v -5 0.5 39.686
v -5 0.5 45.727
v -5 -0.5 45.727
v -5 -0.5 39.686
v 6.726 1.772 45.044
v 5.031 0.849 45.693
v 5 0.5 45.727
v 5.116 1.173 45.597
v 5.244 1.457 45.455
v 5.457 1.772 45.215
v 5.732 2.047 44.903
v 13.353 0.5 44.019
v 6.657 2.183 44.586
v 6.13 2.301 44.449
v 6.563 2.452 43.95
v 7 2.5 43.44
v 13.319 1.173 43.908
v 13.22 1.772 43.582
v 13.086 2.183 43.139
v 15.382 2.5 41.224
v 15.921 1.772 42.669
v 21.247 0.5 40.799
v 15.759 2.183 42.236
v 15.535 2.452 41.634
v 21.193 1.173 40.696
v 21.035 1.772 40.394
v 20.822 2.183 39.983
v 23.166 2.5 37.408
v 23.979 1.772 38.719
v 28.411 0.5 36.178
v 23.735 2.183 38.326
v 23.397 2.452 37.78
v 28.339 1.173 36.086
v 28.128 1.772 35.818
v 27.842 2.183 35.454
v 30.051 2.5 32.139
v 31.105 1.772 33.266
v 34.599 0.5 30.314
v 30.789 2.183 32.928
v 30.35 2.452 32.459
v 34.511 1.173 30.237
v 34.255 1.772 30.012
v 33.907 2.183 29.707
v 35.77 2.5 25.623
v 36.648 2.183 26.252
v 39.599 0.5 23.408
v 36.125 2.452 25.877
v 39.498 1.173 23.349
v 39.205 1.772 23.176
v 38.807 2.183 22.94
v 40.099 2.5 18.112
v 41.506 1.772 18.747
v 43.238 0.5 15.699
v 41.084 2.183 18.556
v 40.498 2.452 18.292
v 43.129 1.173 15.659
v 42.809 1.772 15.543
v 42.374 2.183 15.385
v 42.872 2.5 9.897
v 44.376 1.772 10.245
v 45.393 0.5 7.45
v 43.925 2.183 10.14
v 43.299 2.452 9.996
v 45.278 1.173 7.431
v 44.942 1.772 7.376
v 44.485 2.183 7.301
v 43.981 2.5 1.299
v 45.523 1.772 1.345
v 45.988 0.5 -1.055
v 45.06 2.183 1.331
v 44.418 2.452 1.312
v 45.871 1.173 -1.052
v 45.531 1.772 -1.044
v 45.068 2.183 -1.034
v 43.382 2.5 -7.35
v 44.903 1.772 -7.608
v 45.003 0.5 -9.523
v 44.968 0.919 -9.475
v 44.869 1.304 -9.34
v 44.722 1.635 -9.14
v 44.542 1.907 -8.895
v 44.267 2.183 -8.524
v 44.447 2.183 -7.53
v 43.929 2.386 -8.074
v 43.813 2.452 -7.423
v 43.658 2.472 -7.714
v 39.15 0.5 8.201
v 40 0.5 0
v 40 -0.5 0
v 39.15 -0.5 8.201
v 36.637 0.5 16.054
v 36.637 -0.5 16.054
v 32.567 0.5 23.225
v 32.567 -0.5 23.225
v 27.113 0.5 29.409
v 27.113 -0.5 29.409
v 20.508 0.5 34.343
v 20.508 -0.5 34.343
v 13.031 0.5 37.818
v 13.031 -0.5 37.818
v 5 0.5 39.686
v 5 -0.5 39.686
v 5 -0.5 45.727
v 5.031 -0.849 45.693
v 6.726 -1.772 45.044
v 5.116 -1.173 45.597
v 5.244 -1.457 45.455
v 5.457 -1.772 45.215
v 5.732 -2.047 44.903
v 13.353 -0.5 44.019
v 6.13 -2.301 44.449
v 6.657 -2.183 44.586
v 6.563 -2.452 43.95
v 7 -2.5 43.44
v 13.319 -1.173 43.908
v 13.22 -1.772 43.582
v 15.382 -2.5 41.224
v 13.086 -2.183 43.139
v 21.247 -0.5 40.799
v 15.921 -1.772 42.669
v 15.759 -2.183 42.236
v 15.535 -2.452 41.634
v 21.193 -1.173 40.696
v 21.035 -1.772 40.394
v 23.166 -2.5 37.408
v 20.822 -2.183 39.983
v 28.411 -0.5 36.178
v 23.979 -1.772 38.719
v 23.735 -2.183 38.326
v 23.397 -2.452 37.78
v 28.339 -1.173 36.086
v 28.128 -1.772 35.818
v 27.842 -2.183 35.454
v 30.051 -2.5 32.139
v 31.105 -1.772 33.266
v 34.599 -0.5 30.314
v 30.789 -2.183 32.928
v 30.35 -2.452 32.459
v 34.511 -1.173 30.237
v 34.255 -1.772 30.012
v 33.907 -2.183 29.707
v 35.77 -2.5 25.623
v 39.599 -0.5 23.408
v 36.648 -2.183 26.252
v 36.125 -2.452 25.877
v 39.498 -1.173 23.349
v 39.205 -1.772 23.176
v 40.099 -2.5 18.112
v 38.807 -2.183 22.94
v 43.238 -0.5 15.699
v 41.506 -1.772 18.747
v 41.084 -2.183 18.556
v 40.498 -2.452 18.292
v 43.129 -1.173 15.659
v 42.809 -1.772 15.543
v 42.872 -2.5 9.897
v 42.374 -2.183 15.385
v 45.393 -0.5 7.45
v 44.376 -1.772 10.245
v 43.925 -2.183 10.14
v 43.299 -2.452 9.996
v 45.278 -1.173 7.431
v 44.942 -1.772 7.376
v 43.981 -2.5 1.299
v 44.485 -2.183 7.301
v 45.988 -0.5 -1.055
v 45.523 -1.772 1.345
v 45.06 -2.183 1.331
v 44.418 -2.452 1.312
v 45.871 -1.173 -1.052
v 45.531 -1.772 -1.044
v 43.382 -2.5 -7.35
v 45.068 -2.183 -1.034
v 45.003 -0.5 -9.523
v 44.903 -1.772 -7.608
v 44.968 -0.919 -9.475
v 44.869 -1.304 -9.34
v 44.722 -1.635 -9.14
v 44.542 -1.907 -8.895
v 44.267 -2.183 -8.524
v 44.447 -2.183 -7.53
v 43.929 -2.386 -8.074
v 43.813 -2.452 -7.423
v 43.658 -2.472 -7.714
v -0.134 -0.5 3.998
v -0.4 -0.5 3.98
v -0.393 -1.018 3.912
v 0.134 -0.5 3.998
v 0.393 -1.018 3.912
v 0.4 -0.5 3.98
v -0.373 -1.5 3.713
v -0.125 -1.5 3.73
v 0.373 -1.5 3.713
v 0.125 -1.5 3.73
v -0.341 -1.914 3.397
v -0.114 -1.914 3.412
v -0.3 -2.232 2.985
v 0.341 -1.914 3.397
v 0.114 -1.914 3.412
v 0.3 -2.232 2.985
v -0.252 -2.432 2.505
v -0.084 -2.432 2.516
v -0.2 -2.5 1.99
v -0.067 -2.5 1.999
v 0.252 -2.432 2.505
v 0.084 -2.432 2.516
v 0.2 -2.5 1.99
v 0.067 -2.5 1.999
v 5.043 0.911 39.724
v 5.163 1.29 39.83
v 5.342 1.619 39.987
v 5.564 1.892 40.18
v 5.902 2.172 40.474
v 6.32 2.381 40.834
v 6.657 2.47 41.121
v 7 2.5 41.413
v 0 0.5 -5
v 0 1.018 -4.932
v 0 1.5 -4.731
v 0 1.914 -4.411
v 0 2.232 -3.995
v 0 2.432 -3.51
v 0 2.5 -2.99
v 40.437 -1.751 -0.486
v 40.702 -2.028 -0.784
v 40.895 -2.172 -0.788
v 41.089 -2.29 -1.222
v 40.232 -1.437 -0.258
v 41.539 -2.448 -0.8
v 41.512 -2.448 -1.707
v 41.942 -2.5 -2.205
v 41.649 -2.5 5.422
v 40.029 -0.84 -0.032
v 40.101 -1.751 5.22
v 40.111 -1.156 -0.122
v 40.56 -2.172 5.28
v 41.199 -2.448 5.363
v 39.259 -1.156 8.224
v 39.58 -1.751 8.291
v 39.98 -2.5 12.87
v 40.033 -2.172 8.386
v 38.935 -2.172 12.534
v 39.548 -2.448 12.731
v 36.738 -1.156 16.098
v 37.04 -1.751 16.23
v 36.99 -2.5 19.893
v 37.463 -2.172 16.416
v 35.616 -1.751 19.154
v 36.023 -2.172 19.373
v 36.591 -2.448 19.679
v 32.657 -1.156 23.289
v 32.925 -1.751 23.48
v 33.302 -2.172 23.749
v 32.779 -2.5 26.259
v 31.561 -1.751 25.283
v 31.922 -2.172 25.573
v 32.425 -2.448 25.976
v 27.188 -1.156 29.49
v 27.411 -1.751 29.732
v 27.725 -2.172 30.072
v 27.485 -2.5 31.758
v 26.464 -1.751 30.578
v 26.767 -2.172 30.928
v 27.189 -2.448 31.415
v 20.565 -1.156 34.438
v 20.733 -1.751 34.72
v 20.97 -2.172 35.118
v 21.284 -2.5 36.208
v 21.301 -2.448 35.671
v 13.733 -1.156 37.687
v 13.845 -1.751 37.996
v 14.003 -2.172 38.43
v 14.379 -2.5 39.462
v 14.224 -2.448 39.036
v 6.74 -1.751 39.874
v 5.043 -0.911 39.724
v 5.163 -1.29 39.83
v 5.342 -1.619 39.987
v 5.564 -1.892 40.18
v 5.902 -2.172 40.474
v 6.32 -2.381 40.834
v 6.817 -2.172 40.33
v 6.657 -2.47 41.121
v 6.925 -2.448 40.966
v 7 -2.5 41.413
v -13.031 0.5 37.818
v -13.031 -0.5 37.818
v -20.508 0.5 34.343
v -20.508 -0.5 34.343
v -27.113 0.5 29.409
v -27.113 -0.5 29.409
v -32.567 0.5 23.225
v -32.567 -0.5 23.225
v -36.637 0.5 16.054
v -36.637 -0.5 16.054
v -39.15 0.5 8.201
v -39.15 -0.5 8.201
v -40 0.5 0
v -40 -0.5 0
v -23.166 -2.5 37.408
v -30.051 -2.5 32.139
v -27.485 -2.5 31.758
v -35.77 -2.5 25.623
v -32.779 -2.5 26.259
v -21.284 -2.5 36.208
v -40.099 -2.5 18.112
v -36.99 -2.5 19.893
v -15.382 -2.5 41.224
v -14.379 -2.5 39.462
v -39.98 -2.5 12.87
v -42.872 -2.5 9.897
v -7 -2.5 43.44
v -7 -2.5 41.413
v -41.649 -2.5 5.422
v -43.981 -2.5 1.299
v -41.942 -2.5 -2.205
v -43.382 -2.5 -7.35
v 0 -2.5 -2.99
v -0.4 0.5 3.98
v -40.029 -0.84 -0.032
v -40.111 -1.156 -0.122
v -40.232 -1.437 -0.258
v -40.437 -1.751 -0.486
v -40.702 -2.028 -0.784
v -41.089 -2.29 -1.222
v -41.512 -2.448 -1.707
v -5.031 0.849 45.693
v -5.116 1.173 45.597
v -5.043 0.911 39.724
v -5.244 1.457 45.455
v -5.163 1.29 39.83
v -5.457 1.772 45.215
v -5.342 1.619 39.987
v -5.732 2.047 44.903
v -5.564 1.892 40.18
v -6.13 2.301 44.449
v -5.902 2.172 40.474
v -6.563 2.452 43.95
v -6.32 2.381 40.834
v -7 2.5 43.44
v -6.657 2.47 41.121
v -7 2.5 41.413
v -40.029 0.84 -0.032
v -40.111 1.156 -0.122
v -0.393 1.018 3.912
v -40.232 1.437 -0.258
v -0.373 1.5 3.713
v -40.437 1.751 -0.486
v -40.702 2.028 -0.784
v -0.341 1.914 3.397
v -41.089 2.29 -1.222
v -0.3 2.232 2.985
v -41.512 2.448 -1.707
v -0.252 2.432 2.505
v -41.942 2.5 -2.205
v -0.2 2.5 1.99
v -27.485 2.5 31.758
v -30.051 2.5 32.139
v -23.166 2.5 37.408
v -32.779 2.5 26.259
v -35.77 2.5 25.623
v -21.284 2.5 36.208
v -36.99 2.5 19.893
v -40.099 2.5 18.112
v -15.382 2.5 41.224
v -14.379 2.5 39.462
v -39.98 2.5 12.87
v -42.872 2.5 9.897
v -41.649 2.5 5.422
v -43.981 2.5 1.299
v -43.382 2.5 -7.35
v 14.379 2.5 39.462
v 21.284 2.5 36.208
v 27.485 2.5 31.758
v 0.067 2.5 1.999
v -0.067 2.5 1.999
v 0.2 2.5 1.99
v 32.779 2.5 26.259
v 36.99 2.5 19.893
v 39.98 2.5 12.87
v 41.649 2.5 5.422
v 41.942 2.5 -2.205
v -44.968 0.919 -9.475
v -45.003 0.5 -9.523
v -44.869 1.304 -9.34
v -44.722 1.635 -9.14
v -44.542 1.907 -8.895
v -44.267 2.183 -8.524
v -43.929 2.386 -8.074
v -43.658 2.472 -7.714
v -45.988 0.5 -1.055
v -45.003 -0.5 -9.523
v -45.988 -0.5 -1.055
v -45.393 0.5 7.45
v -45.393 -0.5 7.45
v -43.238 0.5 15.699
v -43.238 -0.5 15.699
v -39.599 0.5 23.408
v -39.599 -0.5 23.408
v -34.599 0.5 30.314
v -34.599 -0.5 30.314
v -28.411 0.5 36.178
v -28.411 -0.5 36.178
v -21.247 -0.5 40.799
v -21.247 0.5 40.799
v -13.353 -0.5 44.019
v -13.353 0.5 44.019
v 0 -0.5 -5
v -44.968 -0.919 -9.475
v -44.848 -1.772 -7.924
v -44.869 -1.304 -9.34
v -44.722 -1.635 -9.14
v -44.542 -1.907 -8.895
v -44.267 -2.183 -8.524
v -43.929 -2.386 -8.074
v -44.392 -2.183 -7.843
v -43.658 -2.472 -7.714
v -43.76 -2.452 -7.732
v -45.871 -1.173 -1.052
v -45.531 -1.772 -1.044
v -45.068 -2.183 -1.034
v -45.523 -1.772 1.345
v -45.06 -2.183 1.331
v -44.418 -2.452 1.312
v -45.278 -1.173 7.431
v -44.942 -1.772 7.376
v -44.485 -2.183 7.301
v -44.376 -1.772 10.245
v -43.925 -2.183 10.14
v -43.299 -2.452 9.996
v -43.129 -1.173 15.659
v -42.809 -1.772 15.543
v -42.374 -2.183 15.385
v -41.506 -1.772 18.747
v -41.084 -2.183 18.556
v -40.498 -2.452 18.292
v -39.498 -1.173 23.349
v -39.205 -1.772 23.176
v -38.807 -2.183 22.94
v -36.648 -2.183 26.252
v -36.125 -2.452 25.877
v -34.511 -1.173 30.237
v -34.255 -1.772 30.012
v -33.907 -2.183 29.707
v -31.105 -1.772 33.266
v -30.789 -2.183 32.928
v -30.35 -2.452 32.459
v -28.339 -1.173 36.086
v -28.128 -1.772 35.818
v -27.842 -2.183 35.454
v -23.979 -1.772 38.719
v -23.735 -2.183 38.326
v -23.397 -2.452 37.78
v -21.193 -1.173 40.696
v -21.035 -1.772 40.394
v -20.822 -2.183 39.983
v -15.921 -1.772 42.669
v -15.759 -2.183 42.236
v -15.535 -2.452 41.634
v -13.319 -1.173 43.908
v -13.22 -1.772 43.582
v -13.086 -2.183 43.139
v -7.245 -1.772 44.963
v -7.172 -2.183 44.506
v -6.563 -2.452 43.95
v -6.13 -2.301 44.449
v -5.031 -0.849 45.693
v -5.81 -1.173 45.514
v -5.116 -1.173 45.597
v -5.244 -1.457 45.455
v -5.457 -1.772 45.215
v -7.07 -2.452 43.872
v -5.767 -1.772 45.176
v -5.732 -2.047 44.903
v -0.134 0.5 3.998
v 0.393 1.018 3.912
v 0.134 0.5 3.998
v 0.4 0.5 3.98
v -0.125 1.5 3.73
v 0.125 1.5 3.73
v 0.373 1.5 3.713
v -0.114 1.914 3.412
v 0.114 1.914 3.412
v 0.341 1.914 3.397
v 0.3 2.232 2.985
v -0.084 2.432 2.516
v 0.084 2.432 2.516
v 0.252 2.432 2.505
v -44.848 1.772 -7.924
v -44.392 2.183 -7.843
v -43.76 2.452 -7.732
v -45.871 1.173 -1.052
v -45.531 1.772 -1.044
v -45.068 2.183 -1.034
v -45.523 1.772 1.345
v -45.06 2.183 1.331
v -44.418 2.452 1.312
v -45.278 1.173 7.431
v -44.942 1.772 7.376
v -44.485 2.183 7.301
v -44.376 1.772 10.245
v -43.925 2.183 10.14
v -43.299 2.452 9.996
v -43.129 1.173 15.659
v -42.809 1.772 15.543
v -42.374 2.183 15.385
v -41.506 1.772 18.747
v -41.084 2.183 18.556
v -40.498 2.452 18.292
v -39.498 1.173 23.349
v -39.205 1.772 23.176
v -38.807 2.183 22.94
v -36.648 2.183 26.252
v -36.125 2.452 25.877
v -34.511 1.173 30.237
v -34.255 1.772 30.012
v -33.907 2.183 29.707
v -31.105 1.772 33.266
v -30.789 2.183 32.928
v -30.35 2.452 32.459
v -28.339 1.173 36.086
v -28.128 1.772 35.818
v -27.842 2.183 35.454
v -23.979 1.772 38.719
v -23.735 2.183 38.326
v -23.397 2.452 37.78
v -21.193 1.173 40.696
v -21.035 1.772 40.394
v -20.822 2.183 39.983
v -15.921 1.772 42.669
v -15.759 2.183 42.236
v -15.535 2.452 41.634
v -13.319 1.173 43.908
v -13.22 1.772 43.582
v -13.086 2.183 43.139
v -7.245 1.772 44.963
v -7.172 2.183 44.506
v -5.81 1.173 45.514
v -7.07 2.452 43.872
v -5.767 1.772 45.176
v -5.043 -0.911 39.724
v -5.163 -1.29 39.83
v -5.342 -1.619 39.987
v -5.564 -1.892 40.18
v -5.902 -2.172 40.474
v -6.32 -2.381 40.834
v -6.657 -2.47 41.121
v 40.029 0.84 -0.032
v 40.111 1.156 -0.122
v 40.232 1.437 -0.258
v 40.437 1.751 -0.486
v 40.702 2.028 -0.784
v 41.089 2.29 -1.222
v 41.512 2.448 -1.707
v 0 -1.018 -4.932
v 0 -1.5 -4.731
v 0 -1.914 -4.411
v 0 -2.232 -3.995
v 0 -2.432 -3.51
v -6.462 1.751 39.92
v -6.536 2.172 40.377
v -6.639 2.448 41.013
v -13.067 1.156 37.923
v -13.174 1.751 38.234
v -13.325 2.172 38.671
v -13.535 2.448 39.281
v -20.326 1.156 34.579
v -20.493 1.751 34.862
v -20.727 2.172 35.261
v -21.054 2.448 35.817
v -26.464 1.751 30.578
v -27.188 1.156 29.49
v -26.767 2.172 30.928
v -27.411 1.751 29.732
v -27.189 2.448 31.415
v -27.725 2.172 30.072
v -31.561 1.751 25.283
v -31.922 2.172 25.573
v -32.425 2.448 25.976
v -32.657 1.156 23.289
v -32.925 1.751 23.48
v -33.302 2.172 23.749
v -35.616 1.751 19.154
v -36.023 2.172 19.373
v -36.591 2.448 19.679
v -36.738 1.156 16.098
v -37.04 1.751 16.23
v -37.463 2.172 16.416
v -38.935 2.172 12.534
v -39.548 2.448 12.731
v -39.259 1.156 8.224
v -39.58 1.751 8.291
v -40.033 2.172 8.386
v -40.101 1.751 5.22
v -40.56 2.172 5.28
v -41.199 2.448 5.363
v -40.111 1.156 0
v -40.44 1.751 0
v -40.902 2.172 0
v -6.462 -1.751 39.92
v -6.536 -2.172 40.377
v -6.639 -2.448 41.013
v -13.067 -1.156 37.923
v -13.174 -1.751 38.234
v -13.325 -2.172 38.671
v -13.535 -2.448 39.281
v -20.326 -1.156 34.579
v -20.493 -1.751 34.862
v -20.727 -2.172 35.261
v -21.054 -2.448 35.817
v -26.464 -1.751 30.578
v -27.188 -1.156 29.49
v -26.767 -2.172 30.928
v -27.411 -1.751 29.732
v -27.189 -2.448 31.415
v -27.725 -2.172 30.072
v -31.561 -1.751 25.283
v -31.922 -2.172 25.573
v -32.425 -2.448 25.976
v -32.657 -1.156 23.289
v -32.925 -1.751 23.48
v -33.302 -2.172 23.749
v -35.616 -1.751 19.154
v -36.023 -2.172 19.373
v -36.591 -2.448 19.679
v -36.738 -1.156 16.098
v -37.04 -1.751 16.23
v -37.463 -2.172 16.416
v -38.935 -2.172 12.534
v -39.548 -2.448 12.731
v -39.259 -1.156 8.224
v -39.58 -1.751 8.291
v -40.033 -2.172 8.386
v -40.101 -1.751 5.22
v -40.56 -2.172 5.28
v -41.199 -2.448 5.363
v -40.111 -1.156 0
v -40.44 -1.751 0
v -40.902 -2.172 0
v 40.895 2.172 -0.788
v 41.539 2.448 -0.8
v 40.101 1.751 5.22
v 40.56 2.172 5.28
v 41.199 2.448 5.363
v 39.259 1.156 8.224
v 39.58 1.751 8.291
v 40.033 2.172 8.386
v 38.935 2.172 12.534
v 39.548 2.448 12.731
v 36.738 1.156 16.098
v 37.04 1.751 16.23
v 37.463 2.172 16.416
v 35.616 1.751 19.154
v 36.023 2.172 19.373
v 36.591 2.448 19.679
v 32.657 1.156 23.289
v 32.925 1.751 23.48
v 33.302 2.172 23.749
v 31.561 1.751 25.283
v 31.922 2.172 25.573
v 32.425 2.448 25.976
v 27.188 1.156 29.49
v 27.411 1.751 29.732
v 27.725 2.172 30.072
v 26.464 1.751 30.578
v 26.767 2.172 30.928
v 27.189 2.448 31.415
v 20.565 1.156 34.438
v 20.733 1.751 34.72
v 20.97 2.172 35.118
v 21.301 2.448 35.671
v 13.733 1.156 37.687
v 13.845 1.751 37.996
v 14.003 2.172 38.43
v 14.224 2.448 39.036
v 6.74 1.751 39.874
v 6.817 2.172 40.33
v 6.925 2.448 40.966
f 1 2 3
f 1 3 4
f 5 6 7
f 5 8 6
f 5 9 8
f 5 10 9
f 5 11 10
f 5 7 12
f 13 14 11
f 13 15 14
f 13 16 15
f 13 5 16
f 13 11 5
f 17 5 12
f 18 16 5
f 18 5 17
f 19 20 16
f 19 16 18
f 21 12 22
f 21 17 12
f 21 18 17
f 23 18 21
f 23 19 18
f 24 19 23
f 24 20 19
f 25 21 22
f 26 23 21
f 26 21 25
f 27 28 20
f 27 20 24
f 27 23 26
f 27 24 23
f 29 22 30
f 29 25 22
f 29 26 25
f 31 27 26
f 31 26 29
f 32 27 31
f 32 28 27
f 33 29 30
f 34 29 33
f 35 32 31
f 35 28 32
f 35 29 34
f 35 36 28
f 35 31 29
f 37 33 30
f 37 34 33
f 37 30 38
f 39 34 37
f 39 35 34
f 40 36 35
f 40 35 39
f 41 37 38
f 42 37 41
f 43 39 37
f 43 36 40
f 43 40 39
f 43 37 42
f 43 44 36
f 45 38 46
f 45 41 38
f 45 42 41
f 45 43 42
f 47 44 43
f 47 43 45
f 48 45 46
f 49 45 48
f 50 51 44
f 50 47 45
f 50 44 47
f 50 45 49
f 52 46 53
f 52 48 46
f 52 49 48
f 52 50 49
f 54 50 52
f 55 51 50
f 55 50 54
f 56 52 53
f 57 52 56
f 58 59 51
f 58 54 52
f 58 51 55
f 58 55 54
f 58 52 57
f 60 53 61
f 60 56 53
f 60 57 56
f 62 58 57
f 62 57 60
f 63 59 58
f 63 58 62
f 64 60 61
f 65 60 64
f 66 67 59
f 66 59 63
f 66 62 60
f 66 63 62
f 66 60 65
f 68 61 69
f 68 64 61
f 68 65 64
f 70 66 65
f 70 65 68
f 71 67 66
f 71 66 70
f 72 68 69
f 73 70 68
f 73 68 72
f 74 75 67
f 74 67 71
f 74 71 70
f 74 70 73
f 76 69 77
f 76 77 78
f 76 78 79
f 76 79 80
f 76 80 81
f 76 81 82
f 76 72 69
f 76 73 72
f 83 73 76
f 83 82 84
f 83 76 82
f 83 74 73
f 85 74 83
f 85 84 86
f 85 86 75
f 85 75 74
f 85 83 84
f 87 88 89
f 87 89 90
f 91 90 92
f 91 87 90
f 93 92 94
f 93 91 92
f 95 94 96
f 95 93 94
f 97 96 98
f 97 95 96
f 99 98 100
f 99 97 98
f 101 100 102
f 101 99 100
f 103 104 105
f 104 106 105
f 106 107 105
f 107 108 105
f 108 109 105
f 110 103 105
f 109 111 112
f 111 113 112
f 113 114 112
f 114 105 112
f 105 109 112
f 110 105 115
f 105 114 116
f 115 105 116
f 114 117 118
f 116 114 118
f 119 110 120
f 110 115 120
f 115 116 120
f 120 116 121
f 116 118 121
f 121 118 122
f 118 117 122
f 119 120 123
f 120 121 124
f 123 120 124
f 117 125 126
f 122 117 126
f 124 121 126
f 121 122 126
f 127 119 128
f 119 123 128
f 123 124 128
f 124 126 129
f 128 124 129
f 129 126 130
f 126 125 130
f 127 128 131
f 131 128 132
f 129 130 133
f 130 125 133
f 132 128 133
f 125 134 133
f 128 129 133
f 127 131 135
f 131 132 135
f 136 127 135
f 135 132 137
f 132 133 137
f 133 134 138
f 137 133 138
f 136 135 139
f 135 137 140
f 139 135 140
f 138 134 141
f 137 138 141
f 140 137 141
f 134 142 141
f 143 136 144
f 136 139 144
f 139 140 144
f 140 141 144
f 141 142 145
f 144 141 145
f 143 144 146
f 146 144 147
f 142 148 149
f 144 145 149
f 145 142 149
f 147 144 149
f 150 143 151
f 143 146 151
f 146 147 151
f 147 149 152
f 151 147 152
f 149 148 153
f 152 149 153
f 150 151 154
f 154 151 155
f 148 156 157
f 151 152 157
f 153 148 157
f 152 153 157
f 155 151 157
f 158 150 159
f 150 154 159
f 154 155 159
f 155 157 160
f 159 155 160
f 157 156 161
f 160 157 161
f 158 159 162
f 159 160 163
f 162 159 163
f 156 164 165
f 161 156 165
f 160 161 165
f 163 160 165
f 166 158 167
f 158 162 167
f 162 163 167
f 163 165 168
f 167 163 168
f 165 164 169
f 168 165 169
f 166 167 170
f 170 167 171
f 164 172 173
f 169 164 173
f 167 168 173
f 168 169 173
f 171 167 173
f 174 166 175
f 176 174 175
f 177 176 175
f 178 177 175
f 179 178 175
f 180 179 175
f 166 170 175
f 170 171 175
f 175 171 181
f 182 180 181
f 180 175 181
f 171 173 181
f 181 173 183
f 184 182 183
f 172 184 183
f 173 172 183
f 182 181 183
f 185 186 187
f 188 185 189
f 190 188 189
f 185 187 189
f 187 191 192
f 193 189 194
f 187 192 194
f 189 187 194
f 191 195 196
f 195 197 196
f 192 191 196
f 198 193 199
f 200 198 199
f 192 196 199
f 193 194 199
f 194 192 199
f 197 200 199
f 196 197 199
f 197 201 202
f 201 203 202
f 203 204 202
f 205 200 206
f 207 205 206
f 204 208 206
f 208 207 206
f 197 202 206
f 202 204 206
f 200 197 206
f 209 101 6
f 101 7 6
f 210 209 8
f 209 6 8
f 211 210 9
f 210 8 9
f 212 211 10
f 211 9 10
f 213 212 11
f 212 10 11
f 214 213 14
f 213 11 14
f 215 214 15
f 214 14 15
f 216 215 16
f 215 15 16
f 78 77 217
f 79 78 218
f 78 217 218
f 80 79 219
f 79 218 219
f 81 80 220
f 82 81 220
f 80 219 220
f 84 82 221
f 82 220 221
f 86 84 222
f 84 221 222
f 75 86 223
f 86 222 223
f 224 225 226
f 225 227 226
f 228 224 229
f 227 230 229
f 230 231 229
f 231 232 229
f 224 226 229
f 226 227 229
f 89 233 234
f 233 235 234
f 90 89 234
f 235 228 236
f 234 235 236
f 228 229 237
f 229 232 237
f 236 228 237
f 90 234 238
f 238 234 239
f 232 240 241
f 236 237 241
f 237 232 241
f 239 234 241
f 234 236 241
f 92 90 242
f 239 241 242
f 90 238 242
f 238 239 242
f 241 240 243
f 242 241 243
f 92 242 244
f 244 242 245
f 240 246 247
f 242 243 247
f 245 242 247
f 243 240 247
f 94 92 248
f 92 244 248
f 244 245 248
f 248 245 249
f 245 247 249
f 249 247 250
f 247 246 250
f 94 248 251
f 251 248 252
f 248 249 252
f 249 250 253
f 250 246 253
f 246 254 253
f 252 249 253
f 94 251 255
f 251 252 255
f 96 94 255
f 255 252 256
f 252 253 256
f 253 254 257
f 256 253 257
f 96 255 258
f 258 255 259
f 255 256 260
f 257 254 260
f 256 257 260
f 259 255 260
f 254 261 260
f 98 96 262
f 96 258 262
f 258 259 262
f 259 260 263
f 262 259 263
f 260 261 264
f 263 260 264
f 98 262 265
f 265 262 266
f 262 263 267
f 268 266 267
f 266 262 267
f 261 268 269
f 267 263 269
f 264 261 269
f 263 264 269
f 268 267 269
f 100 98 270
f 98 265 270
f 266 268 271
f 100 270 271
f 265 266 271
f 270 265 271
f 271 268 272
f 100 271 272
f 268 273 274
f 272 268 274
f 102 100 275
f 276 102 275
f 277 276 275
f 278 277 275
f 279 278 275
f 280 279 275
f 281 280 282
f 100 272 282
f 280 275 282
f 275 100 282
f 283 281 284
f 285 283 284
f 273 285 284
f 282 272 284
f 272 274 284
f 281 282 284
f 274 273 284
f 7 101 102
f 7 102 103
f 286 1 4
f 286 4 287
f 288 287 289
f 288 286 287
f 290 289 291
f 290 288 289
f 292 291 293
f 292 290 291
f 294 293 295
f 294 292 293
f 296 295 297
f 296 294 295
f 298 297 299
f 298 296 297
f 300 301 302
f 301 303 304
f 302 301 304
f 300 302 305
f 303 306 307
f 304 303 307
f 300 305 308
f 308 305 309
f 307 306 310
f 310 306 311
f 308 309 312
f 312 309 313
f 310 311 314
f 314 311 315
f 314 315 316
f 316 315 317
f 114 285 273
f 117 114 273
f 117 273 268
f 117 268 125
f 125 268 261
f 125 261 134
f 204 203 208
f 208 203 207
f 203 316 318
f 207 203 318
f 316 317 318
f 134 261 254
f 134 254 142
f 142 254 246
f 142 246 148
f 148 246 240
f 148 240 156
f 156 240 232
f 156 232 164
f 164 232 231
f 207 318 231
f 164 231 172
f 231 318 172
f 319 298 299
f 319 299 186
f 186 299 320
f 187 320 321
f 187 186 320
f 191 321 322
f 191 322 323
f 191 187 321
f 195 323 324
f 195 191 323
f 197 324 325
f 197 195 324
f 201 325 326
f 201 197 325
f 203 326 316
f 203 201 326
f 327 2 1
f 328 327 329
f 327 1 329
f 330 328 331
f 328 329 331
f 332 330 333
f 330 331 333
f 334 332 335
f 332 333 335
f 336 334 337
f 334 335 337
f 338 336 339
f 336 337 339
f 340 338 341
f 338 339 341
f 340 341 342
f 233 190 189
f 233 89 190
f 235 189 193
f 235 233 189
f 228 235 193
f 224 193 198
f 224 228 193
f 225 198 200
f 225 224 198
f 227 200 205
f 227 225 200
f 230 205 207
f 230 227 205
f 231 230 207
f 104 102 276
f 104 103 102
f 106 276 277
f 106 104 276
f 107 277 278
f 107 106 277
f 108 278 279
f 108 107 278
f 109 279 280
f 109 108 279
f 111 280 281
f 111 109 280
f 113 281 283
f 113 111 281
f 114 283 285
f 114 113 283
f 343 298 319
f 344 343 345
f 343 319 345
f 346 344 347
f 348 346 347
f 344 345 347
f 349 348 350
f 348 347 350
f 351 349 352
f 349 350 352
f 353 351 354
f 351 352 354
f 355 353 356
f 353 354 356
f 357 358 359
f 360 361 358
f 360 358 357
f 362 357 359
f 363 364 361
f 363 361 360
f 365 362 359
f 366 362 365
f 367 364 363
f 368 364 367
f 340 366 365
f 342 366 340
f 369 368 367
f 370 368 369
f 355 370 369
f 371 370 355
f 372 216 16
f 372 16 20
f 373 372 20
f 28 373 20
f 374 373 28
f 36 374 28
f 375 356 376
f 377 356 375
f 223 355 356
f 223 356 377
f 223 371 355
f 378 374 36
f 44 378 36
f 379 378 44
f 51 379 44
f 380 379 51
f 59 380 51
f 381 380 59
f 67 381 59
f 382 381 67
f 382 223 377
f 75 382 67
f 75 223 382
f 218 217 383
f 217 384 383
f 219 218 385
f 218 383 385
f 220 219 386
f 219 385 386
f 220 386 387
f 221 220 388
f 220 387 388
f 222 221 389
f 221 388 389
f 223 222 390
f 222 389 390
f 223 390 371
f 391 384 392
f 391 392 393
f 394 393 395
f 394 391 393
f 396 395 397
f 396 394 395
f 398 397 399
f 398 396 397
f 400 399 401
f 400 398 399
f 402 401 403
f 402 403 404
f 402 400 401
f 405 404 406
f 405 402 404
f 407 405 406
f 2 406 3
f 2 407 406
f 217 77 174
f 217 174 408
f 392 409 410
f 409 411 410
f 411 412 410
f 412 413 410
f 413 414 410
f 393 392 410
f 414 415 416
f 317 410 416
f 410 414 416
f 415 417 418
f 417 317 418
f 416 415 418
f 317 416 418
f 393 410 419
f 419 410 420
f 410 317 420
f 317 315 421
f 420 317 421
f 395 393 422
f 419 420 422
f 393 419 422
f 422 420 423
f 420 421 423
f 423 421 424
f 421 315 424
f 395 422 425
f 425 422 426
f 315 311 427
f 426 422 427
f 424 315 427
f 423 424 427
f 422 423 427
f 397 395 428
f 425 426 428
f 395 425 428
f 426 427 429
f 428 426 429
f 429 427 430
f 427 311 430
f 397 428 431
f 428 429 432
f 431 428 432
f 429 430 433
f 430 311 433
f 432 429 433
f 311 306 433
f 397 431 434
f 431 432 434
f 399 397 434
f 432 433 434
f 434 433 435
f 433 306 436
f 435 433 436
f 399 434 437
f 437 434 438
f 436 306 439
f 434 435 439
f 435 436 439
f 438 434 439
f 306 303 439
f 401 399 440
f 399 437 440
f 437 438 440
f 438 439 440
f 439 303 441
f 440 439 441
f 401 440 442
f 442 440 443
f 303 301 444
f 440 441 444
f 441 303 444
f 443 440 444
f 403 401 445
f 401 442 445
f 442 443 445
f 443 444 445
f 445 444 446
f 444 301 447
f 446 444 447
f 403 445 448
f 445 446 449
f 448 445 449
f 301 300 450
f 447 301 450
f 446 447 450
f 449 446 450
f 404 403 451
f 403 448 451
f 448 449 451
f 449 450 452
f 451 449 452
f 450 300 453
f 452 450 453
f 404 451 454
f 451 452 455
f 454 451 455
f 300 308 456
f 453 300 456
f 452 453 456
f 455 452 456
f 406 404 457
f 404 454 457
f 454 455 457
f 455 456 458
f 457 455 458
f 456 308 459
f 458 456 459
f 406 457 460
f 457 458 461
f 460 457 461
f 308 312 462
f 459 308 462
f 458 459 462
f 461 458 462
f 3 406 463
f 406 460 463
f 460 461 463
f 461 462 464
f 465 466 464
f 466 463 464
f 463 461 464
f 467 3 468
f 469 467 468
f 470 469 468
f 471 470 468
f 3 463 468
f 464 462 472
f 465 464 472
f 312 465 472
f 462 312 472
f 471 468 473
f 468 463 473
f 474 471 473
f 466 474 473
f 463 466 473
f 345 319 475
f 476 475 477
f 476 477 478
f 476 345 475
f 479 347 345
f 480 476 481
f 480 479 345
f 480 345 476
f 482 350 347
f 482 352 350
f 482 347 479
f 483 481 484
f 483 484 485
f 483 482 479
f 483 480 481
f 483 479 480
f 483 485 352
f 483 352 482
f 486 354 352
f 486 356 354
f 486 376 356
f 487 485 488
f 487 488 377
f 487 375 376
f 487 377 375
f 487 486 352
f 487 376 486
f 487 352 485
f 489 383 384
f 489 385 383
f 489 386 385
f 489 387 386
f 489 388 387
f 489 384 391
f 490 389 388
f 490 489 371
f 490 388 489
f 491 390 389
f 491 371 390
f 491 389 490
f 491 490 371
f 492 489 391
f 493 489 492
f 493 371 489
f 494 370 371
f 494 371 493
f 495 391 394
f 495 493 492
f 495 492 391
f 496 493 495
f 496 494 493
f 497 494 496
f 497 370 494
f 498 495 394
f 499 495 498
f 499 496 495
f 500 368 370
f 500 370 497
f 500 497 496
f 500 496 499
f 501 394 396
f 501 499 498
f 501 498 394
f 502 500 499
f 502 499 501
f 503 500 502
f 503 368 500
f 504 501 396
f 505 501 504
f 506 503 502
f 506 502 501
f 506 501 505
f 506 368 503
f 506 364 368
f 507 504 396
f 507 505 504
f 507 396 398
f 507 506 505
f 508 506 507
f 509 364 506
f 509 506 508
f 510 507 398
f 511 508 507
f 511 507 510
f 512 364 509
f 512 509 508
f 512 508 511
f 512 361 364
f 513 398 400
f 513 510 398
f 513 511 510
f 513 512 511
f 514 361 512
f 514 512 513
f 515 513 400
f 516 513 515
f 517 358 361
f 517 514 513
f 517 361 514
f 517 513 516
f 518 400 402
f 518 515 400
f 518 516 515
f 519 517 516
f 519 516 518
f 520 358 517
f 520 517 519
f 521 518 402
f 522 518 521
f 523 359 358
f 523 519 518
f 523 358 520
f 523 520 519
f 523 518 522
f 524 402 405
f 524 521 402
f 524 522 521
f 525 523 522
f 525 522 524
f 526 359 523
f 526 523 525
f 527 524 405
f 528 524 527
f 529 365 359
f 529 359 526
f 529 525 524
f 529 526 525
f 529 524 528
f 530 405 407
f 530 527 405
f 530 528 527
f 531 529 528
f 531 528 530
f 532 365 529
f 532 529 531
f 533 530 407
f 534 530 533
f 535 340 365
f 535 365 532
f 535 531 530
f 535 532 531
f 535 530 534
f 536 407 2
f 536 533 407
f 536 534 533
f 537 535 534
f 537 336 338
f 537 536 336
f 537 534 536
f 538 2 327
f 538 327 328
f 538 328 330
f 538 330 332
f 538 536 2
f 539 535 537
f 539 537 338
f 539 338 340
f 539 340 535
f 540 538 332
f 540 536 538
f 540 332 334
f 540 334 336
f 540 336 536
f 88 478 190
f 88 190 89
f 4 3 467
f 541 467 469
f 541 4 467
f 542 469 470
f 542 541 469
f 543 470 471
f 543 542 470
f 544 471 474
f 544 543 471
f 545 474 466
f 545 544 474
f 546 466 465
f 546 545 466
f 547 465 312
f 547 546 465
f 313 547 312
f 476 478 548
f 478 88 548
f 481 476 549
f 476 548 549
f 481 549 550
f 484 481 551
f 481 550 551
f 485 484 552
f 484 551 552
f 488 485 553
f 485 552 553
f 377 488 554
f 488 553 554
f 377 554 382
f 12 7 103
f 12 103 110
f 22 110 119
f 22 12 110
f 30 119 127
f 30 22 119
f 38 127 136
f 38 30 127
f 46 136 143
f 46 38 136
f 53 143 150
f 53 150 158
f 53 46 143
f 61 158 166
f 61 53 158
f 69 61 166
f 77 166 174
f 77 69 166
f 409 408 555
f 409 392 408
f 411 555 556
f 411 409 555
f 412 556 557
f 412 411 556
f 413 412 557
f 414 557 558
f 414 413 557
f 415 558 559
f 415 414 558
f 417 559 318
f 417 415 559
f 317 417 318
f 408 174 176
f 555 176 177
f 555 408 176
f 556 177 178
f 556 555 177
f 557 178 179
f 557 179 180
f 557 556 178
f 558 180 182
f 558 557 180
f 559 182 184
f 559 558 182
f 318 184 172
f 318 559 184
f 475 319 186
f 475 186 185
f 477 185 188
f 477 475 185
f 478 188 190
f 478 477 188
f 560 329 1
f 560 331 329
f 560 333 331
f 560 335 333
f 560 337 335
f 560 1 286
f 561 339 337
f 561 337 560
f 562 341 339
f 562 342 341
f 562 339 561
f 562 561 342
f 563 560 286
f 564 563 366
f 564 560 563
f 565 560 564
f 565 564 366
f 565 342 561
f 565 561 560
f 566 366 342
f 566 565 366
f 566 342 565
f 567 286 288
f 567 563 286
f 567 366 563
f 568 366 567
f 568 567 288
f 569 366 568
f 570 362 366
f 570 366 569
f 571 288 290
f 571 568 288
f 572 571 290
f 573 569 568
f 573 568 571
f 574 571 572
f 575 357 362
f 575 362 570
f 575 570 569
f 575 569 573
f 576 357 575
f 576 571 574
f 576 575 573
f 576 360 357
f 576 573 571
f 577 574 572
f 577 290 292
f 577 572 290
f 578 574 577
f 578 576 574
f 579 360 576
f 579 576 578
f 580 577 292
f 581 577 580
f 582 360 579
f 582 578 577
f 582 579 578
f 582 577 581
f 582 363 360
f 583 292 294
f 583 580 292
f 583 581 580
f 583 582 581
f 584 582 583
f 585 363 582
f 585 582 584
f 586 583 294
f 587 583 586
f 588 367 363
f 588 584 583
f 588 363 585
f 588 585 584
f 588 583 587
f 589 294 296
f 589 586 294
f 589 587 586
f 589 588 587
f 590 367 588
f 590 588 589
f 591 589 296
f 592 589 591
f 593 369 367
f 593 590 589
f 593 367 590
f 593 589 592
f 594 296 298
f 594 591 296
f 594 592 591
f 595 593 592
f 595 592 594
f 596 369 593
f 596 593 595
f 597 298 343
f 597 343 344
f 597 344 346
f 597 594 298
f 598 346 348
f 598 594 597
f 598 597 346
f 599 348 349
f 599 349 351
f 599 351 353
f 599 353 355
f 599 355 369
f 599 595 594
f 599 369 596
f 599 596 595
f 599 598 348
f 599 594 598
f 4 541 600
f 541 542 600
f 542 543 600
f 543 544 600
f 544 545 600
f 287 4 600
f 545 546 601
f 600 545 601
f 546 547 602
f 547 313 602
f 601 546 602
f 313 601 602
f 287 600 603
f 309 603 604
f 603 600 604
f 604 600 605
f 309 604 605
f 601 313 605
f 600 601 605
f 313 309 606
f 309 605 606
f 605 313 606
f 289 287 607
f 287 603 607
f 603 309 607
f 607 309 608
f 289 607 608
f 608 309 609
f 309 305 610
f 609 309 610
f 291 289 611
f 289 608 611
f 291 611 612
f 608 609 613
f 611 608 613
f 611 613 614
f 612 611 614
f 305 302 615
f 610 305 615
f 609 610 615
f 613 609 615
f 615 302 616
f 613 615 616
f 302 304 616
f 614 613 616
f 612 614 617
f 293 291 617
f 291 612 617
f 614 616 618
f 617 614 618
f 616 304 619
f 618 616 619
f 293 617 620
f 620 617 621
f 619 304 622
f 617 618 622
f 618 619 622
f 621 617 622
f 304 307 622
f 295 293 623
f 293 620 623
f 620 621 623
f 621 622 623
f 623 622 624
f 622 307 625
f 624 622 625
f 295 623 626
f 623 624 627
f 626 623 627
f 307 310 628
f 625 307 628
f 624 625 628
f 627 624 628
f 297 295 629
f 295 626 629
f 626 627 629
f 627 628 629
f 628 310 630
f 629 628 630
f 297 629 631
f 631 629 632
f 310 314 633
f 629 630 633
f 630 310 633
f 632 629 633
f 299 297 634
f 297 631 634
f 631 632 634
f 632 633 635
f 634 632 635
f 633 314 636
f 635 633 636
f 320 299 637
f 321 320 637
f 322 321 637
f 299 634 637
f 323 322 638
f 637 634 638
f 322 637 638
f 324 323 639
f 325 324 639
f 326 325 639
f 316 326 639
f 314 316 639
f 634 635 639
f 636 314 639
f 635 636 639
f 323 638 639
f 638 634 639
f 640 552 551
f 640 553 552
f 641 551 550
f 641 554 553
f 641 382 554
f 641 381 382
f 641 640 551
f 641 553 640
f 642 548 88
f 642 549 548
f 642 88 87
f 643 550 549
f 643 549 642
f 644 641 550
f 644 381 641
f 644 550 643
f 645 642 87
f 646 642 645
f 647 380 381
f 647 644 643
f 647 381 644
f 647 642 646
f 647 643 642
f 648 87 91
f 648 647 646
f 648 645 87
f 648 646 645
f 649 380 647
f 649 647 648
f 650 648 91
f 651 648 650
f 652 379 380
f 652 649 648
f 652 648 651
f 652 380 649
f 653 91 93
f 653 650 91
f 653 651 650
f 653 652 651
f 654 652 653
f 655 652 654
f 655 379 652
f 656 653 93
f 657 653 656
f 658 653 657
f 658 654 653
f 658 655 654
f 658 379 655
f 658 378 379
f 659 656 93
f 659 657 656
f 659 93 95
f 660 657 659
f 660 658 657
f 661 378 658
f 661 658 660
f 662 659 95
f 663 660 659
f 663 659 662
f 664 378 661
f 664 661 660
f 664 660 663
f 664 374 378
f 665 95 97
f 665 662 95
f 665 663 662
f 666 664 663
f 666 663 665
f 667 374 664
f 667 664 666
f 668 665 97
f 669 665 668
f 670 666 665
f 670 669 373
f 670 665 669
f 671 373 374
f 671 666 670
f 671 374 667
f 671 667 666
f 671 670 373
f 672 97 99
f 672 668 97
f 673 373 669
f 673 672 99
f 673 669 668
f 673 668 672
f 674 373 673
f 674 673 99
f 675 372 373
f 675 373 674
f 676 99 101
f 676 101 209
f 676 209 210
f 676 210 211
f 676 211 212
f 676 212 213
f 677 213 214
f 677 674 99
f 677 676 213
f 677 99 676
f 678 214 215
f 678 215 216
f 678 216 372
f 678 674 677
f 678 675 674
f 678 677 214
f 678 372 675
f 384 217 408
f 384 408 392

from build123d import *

# Parameters (mm, degrees)
BOSS_EXTRUDE1_DEPTH = 2.5
FILLET1_R           = 2


with BuildPart() as part:
    # Sketch1 → Boss-Extrude1 (new, symmetric)
    with BuildSketch(Plane(origin=(0, 0, 0), x_dir=(1, 0, 0), z_dir=(0, 1, 0))):
        with BuildLine():
            Line((-40, 0), (-0.4, -3.979949748))
            ThreePointArc((-0.4, -3.979949748), (0, -4), (0.4, -3.979949748))
            Line((0.4, -3.979949748), (40, 0))
            ThreePointArc((40, 0), (30, -26.457513111), (5, -39.686269666))
            Line((5, -39.686269666), (5, -45.727453461))
            ThreePointArc((5, -45.727453461), (37.25909777, -26.977020468), (45.00346781, 9.523018697))
            Line((45.00346781, 9.523018697), (0, 5))
            Line((0, 5), (-45.00346781, 9.523018697))
            ThreePointArc((-45.00346781, 9.523018697), (-37.25909777, -26.977020468), (-5, -45.727453461))
            Line((-5, -45.727453461), (-5, -39.686269666))
            ThreePointArc((-5, -39.686269666), (-30, -26.457513111), (-40, 0))
        make_face()
    extrude(amount=BOSS_EXTRUDE1_DEPTH, both=True)

    # Fillet1
    fillet1_edges = [part.edges().sort_by_distance(p)[0] for p in [
        (20.2, 2.5, 1.989974874),
        (-20.2, -2.5, 1.989974874),
        (-30, -2.5, 26.457513111),
        (-5, -2.5, 42.706861563),
        (-37.25909777, -2.5, 26.977020468),
        (-22.501733905, -2.5, -7.261509348),
        (22.501733905, -2.5, -7.261509348),
        (30, 2.5, 26.457513111),
        (37.25909777, -2.5, 26.977020468),
        (5, -2.5, 42.706861563),
        (30, -2.5, 26.457513111),
        (20.2, -2.5, 1.989974874),
        (0, -2.5, 4),
        (5, 2.5, 42.706861563),
        (37.25909777, 2.5, 26.977020468),
        (22.501733905, 2.5, -7.261509348),
        (-22.501733905, 2.5, -7.261509348),
        (-37.25909777, 2.5, 26.977020468),
        (-5, 2.5, 42.706861563),
        (0, 2.5, 4),
        (-30, 2.5, 26.457513111),
        (-20.2, 2.5, 1.989974874),
    ]]
    fillet(fillet1_edges, radius=FILLET1_R)


solid = part.part
